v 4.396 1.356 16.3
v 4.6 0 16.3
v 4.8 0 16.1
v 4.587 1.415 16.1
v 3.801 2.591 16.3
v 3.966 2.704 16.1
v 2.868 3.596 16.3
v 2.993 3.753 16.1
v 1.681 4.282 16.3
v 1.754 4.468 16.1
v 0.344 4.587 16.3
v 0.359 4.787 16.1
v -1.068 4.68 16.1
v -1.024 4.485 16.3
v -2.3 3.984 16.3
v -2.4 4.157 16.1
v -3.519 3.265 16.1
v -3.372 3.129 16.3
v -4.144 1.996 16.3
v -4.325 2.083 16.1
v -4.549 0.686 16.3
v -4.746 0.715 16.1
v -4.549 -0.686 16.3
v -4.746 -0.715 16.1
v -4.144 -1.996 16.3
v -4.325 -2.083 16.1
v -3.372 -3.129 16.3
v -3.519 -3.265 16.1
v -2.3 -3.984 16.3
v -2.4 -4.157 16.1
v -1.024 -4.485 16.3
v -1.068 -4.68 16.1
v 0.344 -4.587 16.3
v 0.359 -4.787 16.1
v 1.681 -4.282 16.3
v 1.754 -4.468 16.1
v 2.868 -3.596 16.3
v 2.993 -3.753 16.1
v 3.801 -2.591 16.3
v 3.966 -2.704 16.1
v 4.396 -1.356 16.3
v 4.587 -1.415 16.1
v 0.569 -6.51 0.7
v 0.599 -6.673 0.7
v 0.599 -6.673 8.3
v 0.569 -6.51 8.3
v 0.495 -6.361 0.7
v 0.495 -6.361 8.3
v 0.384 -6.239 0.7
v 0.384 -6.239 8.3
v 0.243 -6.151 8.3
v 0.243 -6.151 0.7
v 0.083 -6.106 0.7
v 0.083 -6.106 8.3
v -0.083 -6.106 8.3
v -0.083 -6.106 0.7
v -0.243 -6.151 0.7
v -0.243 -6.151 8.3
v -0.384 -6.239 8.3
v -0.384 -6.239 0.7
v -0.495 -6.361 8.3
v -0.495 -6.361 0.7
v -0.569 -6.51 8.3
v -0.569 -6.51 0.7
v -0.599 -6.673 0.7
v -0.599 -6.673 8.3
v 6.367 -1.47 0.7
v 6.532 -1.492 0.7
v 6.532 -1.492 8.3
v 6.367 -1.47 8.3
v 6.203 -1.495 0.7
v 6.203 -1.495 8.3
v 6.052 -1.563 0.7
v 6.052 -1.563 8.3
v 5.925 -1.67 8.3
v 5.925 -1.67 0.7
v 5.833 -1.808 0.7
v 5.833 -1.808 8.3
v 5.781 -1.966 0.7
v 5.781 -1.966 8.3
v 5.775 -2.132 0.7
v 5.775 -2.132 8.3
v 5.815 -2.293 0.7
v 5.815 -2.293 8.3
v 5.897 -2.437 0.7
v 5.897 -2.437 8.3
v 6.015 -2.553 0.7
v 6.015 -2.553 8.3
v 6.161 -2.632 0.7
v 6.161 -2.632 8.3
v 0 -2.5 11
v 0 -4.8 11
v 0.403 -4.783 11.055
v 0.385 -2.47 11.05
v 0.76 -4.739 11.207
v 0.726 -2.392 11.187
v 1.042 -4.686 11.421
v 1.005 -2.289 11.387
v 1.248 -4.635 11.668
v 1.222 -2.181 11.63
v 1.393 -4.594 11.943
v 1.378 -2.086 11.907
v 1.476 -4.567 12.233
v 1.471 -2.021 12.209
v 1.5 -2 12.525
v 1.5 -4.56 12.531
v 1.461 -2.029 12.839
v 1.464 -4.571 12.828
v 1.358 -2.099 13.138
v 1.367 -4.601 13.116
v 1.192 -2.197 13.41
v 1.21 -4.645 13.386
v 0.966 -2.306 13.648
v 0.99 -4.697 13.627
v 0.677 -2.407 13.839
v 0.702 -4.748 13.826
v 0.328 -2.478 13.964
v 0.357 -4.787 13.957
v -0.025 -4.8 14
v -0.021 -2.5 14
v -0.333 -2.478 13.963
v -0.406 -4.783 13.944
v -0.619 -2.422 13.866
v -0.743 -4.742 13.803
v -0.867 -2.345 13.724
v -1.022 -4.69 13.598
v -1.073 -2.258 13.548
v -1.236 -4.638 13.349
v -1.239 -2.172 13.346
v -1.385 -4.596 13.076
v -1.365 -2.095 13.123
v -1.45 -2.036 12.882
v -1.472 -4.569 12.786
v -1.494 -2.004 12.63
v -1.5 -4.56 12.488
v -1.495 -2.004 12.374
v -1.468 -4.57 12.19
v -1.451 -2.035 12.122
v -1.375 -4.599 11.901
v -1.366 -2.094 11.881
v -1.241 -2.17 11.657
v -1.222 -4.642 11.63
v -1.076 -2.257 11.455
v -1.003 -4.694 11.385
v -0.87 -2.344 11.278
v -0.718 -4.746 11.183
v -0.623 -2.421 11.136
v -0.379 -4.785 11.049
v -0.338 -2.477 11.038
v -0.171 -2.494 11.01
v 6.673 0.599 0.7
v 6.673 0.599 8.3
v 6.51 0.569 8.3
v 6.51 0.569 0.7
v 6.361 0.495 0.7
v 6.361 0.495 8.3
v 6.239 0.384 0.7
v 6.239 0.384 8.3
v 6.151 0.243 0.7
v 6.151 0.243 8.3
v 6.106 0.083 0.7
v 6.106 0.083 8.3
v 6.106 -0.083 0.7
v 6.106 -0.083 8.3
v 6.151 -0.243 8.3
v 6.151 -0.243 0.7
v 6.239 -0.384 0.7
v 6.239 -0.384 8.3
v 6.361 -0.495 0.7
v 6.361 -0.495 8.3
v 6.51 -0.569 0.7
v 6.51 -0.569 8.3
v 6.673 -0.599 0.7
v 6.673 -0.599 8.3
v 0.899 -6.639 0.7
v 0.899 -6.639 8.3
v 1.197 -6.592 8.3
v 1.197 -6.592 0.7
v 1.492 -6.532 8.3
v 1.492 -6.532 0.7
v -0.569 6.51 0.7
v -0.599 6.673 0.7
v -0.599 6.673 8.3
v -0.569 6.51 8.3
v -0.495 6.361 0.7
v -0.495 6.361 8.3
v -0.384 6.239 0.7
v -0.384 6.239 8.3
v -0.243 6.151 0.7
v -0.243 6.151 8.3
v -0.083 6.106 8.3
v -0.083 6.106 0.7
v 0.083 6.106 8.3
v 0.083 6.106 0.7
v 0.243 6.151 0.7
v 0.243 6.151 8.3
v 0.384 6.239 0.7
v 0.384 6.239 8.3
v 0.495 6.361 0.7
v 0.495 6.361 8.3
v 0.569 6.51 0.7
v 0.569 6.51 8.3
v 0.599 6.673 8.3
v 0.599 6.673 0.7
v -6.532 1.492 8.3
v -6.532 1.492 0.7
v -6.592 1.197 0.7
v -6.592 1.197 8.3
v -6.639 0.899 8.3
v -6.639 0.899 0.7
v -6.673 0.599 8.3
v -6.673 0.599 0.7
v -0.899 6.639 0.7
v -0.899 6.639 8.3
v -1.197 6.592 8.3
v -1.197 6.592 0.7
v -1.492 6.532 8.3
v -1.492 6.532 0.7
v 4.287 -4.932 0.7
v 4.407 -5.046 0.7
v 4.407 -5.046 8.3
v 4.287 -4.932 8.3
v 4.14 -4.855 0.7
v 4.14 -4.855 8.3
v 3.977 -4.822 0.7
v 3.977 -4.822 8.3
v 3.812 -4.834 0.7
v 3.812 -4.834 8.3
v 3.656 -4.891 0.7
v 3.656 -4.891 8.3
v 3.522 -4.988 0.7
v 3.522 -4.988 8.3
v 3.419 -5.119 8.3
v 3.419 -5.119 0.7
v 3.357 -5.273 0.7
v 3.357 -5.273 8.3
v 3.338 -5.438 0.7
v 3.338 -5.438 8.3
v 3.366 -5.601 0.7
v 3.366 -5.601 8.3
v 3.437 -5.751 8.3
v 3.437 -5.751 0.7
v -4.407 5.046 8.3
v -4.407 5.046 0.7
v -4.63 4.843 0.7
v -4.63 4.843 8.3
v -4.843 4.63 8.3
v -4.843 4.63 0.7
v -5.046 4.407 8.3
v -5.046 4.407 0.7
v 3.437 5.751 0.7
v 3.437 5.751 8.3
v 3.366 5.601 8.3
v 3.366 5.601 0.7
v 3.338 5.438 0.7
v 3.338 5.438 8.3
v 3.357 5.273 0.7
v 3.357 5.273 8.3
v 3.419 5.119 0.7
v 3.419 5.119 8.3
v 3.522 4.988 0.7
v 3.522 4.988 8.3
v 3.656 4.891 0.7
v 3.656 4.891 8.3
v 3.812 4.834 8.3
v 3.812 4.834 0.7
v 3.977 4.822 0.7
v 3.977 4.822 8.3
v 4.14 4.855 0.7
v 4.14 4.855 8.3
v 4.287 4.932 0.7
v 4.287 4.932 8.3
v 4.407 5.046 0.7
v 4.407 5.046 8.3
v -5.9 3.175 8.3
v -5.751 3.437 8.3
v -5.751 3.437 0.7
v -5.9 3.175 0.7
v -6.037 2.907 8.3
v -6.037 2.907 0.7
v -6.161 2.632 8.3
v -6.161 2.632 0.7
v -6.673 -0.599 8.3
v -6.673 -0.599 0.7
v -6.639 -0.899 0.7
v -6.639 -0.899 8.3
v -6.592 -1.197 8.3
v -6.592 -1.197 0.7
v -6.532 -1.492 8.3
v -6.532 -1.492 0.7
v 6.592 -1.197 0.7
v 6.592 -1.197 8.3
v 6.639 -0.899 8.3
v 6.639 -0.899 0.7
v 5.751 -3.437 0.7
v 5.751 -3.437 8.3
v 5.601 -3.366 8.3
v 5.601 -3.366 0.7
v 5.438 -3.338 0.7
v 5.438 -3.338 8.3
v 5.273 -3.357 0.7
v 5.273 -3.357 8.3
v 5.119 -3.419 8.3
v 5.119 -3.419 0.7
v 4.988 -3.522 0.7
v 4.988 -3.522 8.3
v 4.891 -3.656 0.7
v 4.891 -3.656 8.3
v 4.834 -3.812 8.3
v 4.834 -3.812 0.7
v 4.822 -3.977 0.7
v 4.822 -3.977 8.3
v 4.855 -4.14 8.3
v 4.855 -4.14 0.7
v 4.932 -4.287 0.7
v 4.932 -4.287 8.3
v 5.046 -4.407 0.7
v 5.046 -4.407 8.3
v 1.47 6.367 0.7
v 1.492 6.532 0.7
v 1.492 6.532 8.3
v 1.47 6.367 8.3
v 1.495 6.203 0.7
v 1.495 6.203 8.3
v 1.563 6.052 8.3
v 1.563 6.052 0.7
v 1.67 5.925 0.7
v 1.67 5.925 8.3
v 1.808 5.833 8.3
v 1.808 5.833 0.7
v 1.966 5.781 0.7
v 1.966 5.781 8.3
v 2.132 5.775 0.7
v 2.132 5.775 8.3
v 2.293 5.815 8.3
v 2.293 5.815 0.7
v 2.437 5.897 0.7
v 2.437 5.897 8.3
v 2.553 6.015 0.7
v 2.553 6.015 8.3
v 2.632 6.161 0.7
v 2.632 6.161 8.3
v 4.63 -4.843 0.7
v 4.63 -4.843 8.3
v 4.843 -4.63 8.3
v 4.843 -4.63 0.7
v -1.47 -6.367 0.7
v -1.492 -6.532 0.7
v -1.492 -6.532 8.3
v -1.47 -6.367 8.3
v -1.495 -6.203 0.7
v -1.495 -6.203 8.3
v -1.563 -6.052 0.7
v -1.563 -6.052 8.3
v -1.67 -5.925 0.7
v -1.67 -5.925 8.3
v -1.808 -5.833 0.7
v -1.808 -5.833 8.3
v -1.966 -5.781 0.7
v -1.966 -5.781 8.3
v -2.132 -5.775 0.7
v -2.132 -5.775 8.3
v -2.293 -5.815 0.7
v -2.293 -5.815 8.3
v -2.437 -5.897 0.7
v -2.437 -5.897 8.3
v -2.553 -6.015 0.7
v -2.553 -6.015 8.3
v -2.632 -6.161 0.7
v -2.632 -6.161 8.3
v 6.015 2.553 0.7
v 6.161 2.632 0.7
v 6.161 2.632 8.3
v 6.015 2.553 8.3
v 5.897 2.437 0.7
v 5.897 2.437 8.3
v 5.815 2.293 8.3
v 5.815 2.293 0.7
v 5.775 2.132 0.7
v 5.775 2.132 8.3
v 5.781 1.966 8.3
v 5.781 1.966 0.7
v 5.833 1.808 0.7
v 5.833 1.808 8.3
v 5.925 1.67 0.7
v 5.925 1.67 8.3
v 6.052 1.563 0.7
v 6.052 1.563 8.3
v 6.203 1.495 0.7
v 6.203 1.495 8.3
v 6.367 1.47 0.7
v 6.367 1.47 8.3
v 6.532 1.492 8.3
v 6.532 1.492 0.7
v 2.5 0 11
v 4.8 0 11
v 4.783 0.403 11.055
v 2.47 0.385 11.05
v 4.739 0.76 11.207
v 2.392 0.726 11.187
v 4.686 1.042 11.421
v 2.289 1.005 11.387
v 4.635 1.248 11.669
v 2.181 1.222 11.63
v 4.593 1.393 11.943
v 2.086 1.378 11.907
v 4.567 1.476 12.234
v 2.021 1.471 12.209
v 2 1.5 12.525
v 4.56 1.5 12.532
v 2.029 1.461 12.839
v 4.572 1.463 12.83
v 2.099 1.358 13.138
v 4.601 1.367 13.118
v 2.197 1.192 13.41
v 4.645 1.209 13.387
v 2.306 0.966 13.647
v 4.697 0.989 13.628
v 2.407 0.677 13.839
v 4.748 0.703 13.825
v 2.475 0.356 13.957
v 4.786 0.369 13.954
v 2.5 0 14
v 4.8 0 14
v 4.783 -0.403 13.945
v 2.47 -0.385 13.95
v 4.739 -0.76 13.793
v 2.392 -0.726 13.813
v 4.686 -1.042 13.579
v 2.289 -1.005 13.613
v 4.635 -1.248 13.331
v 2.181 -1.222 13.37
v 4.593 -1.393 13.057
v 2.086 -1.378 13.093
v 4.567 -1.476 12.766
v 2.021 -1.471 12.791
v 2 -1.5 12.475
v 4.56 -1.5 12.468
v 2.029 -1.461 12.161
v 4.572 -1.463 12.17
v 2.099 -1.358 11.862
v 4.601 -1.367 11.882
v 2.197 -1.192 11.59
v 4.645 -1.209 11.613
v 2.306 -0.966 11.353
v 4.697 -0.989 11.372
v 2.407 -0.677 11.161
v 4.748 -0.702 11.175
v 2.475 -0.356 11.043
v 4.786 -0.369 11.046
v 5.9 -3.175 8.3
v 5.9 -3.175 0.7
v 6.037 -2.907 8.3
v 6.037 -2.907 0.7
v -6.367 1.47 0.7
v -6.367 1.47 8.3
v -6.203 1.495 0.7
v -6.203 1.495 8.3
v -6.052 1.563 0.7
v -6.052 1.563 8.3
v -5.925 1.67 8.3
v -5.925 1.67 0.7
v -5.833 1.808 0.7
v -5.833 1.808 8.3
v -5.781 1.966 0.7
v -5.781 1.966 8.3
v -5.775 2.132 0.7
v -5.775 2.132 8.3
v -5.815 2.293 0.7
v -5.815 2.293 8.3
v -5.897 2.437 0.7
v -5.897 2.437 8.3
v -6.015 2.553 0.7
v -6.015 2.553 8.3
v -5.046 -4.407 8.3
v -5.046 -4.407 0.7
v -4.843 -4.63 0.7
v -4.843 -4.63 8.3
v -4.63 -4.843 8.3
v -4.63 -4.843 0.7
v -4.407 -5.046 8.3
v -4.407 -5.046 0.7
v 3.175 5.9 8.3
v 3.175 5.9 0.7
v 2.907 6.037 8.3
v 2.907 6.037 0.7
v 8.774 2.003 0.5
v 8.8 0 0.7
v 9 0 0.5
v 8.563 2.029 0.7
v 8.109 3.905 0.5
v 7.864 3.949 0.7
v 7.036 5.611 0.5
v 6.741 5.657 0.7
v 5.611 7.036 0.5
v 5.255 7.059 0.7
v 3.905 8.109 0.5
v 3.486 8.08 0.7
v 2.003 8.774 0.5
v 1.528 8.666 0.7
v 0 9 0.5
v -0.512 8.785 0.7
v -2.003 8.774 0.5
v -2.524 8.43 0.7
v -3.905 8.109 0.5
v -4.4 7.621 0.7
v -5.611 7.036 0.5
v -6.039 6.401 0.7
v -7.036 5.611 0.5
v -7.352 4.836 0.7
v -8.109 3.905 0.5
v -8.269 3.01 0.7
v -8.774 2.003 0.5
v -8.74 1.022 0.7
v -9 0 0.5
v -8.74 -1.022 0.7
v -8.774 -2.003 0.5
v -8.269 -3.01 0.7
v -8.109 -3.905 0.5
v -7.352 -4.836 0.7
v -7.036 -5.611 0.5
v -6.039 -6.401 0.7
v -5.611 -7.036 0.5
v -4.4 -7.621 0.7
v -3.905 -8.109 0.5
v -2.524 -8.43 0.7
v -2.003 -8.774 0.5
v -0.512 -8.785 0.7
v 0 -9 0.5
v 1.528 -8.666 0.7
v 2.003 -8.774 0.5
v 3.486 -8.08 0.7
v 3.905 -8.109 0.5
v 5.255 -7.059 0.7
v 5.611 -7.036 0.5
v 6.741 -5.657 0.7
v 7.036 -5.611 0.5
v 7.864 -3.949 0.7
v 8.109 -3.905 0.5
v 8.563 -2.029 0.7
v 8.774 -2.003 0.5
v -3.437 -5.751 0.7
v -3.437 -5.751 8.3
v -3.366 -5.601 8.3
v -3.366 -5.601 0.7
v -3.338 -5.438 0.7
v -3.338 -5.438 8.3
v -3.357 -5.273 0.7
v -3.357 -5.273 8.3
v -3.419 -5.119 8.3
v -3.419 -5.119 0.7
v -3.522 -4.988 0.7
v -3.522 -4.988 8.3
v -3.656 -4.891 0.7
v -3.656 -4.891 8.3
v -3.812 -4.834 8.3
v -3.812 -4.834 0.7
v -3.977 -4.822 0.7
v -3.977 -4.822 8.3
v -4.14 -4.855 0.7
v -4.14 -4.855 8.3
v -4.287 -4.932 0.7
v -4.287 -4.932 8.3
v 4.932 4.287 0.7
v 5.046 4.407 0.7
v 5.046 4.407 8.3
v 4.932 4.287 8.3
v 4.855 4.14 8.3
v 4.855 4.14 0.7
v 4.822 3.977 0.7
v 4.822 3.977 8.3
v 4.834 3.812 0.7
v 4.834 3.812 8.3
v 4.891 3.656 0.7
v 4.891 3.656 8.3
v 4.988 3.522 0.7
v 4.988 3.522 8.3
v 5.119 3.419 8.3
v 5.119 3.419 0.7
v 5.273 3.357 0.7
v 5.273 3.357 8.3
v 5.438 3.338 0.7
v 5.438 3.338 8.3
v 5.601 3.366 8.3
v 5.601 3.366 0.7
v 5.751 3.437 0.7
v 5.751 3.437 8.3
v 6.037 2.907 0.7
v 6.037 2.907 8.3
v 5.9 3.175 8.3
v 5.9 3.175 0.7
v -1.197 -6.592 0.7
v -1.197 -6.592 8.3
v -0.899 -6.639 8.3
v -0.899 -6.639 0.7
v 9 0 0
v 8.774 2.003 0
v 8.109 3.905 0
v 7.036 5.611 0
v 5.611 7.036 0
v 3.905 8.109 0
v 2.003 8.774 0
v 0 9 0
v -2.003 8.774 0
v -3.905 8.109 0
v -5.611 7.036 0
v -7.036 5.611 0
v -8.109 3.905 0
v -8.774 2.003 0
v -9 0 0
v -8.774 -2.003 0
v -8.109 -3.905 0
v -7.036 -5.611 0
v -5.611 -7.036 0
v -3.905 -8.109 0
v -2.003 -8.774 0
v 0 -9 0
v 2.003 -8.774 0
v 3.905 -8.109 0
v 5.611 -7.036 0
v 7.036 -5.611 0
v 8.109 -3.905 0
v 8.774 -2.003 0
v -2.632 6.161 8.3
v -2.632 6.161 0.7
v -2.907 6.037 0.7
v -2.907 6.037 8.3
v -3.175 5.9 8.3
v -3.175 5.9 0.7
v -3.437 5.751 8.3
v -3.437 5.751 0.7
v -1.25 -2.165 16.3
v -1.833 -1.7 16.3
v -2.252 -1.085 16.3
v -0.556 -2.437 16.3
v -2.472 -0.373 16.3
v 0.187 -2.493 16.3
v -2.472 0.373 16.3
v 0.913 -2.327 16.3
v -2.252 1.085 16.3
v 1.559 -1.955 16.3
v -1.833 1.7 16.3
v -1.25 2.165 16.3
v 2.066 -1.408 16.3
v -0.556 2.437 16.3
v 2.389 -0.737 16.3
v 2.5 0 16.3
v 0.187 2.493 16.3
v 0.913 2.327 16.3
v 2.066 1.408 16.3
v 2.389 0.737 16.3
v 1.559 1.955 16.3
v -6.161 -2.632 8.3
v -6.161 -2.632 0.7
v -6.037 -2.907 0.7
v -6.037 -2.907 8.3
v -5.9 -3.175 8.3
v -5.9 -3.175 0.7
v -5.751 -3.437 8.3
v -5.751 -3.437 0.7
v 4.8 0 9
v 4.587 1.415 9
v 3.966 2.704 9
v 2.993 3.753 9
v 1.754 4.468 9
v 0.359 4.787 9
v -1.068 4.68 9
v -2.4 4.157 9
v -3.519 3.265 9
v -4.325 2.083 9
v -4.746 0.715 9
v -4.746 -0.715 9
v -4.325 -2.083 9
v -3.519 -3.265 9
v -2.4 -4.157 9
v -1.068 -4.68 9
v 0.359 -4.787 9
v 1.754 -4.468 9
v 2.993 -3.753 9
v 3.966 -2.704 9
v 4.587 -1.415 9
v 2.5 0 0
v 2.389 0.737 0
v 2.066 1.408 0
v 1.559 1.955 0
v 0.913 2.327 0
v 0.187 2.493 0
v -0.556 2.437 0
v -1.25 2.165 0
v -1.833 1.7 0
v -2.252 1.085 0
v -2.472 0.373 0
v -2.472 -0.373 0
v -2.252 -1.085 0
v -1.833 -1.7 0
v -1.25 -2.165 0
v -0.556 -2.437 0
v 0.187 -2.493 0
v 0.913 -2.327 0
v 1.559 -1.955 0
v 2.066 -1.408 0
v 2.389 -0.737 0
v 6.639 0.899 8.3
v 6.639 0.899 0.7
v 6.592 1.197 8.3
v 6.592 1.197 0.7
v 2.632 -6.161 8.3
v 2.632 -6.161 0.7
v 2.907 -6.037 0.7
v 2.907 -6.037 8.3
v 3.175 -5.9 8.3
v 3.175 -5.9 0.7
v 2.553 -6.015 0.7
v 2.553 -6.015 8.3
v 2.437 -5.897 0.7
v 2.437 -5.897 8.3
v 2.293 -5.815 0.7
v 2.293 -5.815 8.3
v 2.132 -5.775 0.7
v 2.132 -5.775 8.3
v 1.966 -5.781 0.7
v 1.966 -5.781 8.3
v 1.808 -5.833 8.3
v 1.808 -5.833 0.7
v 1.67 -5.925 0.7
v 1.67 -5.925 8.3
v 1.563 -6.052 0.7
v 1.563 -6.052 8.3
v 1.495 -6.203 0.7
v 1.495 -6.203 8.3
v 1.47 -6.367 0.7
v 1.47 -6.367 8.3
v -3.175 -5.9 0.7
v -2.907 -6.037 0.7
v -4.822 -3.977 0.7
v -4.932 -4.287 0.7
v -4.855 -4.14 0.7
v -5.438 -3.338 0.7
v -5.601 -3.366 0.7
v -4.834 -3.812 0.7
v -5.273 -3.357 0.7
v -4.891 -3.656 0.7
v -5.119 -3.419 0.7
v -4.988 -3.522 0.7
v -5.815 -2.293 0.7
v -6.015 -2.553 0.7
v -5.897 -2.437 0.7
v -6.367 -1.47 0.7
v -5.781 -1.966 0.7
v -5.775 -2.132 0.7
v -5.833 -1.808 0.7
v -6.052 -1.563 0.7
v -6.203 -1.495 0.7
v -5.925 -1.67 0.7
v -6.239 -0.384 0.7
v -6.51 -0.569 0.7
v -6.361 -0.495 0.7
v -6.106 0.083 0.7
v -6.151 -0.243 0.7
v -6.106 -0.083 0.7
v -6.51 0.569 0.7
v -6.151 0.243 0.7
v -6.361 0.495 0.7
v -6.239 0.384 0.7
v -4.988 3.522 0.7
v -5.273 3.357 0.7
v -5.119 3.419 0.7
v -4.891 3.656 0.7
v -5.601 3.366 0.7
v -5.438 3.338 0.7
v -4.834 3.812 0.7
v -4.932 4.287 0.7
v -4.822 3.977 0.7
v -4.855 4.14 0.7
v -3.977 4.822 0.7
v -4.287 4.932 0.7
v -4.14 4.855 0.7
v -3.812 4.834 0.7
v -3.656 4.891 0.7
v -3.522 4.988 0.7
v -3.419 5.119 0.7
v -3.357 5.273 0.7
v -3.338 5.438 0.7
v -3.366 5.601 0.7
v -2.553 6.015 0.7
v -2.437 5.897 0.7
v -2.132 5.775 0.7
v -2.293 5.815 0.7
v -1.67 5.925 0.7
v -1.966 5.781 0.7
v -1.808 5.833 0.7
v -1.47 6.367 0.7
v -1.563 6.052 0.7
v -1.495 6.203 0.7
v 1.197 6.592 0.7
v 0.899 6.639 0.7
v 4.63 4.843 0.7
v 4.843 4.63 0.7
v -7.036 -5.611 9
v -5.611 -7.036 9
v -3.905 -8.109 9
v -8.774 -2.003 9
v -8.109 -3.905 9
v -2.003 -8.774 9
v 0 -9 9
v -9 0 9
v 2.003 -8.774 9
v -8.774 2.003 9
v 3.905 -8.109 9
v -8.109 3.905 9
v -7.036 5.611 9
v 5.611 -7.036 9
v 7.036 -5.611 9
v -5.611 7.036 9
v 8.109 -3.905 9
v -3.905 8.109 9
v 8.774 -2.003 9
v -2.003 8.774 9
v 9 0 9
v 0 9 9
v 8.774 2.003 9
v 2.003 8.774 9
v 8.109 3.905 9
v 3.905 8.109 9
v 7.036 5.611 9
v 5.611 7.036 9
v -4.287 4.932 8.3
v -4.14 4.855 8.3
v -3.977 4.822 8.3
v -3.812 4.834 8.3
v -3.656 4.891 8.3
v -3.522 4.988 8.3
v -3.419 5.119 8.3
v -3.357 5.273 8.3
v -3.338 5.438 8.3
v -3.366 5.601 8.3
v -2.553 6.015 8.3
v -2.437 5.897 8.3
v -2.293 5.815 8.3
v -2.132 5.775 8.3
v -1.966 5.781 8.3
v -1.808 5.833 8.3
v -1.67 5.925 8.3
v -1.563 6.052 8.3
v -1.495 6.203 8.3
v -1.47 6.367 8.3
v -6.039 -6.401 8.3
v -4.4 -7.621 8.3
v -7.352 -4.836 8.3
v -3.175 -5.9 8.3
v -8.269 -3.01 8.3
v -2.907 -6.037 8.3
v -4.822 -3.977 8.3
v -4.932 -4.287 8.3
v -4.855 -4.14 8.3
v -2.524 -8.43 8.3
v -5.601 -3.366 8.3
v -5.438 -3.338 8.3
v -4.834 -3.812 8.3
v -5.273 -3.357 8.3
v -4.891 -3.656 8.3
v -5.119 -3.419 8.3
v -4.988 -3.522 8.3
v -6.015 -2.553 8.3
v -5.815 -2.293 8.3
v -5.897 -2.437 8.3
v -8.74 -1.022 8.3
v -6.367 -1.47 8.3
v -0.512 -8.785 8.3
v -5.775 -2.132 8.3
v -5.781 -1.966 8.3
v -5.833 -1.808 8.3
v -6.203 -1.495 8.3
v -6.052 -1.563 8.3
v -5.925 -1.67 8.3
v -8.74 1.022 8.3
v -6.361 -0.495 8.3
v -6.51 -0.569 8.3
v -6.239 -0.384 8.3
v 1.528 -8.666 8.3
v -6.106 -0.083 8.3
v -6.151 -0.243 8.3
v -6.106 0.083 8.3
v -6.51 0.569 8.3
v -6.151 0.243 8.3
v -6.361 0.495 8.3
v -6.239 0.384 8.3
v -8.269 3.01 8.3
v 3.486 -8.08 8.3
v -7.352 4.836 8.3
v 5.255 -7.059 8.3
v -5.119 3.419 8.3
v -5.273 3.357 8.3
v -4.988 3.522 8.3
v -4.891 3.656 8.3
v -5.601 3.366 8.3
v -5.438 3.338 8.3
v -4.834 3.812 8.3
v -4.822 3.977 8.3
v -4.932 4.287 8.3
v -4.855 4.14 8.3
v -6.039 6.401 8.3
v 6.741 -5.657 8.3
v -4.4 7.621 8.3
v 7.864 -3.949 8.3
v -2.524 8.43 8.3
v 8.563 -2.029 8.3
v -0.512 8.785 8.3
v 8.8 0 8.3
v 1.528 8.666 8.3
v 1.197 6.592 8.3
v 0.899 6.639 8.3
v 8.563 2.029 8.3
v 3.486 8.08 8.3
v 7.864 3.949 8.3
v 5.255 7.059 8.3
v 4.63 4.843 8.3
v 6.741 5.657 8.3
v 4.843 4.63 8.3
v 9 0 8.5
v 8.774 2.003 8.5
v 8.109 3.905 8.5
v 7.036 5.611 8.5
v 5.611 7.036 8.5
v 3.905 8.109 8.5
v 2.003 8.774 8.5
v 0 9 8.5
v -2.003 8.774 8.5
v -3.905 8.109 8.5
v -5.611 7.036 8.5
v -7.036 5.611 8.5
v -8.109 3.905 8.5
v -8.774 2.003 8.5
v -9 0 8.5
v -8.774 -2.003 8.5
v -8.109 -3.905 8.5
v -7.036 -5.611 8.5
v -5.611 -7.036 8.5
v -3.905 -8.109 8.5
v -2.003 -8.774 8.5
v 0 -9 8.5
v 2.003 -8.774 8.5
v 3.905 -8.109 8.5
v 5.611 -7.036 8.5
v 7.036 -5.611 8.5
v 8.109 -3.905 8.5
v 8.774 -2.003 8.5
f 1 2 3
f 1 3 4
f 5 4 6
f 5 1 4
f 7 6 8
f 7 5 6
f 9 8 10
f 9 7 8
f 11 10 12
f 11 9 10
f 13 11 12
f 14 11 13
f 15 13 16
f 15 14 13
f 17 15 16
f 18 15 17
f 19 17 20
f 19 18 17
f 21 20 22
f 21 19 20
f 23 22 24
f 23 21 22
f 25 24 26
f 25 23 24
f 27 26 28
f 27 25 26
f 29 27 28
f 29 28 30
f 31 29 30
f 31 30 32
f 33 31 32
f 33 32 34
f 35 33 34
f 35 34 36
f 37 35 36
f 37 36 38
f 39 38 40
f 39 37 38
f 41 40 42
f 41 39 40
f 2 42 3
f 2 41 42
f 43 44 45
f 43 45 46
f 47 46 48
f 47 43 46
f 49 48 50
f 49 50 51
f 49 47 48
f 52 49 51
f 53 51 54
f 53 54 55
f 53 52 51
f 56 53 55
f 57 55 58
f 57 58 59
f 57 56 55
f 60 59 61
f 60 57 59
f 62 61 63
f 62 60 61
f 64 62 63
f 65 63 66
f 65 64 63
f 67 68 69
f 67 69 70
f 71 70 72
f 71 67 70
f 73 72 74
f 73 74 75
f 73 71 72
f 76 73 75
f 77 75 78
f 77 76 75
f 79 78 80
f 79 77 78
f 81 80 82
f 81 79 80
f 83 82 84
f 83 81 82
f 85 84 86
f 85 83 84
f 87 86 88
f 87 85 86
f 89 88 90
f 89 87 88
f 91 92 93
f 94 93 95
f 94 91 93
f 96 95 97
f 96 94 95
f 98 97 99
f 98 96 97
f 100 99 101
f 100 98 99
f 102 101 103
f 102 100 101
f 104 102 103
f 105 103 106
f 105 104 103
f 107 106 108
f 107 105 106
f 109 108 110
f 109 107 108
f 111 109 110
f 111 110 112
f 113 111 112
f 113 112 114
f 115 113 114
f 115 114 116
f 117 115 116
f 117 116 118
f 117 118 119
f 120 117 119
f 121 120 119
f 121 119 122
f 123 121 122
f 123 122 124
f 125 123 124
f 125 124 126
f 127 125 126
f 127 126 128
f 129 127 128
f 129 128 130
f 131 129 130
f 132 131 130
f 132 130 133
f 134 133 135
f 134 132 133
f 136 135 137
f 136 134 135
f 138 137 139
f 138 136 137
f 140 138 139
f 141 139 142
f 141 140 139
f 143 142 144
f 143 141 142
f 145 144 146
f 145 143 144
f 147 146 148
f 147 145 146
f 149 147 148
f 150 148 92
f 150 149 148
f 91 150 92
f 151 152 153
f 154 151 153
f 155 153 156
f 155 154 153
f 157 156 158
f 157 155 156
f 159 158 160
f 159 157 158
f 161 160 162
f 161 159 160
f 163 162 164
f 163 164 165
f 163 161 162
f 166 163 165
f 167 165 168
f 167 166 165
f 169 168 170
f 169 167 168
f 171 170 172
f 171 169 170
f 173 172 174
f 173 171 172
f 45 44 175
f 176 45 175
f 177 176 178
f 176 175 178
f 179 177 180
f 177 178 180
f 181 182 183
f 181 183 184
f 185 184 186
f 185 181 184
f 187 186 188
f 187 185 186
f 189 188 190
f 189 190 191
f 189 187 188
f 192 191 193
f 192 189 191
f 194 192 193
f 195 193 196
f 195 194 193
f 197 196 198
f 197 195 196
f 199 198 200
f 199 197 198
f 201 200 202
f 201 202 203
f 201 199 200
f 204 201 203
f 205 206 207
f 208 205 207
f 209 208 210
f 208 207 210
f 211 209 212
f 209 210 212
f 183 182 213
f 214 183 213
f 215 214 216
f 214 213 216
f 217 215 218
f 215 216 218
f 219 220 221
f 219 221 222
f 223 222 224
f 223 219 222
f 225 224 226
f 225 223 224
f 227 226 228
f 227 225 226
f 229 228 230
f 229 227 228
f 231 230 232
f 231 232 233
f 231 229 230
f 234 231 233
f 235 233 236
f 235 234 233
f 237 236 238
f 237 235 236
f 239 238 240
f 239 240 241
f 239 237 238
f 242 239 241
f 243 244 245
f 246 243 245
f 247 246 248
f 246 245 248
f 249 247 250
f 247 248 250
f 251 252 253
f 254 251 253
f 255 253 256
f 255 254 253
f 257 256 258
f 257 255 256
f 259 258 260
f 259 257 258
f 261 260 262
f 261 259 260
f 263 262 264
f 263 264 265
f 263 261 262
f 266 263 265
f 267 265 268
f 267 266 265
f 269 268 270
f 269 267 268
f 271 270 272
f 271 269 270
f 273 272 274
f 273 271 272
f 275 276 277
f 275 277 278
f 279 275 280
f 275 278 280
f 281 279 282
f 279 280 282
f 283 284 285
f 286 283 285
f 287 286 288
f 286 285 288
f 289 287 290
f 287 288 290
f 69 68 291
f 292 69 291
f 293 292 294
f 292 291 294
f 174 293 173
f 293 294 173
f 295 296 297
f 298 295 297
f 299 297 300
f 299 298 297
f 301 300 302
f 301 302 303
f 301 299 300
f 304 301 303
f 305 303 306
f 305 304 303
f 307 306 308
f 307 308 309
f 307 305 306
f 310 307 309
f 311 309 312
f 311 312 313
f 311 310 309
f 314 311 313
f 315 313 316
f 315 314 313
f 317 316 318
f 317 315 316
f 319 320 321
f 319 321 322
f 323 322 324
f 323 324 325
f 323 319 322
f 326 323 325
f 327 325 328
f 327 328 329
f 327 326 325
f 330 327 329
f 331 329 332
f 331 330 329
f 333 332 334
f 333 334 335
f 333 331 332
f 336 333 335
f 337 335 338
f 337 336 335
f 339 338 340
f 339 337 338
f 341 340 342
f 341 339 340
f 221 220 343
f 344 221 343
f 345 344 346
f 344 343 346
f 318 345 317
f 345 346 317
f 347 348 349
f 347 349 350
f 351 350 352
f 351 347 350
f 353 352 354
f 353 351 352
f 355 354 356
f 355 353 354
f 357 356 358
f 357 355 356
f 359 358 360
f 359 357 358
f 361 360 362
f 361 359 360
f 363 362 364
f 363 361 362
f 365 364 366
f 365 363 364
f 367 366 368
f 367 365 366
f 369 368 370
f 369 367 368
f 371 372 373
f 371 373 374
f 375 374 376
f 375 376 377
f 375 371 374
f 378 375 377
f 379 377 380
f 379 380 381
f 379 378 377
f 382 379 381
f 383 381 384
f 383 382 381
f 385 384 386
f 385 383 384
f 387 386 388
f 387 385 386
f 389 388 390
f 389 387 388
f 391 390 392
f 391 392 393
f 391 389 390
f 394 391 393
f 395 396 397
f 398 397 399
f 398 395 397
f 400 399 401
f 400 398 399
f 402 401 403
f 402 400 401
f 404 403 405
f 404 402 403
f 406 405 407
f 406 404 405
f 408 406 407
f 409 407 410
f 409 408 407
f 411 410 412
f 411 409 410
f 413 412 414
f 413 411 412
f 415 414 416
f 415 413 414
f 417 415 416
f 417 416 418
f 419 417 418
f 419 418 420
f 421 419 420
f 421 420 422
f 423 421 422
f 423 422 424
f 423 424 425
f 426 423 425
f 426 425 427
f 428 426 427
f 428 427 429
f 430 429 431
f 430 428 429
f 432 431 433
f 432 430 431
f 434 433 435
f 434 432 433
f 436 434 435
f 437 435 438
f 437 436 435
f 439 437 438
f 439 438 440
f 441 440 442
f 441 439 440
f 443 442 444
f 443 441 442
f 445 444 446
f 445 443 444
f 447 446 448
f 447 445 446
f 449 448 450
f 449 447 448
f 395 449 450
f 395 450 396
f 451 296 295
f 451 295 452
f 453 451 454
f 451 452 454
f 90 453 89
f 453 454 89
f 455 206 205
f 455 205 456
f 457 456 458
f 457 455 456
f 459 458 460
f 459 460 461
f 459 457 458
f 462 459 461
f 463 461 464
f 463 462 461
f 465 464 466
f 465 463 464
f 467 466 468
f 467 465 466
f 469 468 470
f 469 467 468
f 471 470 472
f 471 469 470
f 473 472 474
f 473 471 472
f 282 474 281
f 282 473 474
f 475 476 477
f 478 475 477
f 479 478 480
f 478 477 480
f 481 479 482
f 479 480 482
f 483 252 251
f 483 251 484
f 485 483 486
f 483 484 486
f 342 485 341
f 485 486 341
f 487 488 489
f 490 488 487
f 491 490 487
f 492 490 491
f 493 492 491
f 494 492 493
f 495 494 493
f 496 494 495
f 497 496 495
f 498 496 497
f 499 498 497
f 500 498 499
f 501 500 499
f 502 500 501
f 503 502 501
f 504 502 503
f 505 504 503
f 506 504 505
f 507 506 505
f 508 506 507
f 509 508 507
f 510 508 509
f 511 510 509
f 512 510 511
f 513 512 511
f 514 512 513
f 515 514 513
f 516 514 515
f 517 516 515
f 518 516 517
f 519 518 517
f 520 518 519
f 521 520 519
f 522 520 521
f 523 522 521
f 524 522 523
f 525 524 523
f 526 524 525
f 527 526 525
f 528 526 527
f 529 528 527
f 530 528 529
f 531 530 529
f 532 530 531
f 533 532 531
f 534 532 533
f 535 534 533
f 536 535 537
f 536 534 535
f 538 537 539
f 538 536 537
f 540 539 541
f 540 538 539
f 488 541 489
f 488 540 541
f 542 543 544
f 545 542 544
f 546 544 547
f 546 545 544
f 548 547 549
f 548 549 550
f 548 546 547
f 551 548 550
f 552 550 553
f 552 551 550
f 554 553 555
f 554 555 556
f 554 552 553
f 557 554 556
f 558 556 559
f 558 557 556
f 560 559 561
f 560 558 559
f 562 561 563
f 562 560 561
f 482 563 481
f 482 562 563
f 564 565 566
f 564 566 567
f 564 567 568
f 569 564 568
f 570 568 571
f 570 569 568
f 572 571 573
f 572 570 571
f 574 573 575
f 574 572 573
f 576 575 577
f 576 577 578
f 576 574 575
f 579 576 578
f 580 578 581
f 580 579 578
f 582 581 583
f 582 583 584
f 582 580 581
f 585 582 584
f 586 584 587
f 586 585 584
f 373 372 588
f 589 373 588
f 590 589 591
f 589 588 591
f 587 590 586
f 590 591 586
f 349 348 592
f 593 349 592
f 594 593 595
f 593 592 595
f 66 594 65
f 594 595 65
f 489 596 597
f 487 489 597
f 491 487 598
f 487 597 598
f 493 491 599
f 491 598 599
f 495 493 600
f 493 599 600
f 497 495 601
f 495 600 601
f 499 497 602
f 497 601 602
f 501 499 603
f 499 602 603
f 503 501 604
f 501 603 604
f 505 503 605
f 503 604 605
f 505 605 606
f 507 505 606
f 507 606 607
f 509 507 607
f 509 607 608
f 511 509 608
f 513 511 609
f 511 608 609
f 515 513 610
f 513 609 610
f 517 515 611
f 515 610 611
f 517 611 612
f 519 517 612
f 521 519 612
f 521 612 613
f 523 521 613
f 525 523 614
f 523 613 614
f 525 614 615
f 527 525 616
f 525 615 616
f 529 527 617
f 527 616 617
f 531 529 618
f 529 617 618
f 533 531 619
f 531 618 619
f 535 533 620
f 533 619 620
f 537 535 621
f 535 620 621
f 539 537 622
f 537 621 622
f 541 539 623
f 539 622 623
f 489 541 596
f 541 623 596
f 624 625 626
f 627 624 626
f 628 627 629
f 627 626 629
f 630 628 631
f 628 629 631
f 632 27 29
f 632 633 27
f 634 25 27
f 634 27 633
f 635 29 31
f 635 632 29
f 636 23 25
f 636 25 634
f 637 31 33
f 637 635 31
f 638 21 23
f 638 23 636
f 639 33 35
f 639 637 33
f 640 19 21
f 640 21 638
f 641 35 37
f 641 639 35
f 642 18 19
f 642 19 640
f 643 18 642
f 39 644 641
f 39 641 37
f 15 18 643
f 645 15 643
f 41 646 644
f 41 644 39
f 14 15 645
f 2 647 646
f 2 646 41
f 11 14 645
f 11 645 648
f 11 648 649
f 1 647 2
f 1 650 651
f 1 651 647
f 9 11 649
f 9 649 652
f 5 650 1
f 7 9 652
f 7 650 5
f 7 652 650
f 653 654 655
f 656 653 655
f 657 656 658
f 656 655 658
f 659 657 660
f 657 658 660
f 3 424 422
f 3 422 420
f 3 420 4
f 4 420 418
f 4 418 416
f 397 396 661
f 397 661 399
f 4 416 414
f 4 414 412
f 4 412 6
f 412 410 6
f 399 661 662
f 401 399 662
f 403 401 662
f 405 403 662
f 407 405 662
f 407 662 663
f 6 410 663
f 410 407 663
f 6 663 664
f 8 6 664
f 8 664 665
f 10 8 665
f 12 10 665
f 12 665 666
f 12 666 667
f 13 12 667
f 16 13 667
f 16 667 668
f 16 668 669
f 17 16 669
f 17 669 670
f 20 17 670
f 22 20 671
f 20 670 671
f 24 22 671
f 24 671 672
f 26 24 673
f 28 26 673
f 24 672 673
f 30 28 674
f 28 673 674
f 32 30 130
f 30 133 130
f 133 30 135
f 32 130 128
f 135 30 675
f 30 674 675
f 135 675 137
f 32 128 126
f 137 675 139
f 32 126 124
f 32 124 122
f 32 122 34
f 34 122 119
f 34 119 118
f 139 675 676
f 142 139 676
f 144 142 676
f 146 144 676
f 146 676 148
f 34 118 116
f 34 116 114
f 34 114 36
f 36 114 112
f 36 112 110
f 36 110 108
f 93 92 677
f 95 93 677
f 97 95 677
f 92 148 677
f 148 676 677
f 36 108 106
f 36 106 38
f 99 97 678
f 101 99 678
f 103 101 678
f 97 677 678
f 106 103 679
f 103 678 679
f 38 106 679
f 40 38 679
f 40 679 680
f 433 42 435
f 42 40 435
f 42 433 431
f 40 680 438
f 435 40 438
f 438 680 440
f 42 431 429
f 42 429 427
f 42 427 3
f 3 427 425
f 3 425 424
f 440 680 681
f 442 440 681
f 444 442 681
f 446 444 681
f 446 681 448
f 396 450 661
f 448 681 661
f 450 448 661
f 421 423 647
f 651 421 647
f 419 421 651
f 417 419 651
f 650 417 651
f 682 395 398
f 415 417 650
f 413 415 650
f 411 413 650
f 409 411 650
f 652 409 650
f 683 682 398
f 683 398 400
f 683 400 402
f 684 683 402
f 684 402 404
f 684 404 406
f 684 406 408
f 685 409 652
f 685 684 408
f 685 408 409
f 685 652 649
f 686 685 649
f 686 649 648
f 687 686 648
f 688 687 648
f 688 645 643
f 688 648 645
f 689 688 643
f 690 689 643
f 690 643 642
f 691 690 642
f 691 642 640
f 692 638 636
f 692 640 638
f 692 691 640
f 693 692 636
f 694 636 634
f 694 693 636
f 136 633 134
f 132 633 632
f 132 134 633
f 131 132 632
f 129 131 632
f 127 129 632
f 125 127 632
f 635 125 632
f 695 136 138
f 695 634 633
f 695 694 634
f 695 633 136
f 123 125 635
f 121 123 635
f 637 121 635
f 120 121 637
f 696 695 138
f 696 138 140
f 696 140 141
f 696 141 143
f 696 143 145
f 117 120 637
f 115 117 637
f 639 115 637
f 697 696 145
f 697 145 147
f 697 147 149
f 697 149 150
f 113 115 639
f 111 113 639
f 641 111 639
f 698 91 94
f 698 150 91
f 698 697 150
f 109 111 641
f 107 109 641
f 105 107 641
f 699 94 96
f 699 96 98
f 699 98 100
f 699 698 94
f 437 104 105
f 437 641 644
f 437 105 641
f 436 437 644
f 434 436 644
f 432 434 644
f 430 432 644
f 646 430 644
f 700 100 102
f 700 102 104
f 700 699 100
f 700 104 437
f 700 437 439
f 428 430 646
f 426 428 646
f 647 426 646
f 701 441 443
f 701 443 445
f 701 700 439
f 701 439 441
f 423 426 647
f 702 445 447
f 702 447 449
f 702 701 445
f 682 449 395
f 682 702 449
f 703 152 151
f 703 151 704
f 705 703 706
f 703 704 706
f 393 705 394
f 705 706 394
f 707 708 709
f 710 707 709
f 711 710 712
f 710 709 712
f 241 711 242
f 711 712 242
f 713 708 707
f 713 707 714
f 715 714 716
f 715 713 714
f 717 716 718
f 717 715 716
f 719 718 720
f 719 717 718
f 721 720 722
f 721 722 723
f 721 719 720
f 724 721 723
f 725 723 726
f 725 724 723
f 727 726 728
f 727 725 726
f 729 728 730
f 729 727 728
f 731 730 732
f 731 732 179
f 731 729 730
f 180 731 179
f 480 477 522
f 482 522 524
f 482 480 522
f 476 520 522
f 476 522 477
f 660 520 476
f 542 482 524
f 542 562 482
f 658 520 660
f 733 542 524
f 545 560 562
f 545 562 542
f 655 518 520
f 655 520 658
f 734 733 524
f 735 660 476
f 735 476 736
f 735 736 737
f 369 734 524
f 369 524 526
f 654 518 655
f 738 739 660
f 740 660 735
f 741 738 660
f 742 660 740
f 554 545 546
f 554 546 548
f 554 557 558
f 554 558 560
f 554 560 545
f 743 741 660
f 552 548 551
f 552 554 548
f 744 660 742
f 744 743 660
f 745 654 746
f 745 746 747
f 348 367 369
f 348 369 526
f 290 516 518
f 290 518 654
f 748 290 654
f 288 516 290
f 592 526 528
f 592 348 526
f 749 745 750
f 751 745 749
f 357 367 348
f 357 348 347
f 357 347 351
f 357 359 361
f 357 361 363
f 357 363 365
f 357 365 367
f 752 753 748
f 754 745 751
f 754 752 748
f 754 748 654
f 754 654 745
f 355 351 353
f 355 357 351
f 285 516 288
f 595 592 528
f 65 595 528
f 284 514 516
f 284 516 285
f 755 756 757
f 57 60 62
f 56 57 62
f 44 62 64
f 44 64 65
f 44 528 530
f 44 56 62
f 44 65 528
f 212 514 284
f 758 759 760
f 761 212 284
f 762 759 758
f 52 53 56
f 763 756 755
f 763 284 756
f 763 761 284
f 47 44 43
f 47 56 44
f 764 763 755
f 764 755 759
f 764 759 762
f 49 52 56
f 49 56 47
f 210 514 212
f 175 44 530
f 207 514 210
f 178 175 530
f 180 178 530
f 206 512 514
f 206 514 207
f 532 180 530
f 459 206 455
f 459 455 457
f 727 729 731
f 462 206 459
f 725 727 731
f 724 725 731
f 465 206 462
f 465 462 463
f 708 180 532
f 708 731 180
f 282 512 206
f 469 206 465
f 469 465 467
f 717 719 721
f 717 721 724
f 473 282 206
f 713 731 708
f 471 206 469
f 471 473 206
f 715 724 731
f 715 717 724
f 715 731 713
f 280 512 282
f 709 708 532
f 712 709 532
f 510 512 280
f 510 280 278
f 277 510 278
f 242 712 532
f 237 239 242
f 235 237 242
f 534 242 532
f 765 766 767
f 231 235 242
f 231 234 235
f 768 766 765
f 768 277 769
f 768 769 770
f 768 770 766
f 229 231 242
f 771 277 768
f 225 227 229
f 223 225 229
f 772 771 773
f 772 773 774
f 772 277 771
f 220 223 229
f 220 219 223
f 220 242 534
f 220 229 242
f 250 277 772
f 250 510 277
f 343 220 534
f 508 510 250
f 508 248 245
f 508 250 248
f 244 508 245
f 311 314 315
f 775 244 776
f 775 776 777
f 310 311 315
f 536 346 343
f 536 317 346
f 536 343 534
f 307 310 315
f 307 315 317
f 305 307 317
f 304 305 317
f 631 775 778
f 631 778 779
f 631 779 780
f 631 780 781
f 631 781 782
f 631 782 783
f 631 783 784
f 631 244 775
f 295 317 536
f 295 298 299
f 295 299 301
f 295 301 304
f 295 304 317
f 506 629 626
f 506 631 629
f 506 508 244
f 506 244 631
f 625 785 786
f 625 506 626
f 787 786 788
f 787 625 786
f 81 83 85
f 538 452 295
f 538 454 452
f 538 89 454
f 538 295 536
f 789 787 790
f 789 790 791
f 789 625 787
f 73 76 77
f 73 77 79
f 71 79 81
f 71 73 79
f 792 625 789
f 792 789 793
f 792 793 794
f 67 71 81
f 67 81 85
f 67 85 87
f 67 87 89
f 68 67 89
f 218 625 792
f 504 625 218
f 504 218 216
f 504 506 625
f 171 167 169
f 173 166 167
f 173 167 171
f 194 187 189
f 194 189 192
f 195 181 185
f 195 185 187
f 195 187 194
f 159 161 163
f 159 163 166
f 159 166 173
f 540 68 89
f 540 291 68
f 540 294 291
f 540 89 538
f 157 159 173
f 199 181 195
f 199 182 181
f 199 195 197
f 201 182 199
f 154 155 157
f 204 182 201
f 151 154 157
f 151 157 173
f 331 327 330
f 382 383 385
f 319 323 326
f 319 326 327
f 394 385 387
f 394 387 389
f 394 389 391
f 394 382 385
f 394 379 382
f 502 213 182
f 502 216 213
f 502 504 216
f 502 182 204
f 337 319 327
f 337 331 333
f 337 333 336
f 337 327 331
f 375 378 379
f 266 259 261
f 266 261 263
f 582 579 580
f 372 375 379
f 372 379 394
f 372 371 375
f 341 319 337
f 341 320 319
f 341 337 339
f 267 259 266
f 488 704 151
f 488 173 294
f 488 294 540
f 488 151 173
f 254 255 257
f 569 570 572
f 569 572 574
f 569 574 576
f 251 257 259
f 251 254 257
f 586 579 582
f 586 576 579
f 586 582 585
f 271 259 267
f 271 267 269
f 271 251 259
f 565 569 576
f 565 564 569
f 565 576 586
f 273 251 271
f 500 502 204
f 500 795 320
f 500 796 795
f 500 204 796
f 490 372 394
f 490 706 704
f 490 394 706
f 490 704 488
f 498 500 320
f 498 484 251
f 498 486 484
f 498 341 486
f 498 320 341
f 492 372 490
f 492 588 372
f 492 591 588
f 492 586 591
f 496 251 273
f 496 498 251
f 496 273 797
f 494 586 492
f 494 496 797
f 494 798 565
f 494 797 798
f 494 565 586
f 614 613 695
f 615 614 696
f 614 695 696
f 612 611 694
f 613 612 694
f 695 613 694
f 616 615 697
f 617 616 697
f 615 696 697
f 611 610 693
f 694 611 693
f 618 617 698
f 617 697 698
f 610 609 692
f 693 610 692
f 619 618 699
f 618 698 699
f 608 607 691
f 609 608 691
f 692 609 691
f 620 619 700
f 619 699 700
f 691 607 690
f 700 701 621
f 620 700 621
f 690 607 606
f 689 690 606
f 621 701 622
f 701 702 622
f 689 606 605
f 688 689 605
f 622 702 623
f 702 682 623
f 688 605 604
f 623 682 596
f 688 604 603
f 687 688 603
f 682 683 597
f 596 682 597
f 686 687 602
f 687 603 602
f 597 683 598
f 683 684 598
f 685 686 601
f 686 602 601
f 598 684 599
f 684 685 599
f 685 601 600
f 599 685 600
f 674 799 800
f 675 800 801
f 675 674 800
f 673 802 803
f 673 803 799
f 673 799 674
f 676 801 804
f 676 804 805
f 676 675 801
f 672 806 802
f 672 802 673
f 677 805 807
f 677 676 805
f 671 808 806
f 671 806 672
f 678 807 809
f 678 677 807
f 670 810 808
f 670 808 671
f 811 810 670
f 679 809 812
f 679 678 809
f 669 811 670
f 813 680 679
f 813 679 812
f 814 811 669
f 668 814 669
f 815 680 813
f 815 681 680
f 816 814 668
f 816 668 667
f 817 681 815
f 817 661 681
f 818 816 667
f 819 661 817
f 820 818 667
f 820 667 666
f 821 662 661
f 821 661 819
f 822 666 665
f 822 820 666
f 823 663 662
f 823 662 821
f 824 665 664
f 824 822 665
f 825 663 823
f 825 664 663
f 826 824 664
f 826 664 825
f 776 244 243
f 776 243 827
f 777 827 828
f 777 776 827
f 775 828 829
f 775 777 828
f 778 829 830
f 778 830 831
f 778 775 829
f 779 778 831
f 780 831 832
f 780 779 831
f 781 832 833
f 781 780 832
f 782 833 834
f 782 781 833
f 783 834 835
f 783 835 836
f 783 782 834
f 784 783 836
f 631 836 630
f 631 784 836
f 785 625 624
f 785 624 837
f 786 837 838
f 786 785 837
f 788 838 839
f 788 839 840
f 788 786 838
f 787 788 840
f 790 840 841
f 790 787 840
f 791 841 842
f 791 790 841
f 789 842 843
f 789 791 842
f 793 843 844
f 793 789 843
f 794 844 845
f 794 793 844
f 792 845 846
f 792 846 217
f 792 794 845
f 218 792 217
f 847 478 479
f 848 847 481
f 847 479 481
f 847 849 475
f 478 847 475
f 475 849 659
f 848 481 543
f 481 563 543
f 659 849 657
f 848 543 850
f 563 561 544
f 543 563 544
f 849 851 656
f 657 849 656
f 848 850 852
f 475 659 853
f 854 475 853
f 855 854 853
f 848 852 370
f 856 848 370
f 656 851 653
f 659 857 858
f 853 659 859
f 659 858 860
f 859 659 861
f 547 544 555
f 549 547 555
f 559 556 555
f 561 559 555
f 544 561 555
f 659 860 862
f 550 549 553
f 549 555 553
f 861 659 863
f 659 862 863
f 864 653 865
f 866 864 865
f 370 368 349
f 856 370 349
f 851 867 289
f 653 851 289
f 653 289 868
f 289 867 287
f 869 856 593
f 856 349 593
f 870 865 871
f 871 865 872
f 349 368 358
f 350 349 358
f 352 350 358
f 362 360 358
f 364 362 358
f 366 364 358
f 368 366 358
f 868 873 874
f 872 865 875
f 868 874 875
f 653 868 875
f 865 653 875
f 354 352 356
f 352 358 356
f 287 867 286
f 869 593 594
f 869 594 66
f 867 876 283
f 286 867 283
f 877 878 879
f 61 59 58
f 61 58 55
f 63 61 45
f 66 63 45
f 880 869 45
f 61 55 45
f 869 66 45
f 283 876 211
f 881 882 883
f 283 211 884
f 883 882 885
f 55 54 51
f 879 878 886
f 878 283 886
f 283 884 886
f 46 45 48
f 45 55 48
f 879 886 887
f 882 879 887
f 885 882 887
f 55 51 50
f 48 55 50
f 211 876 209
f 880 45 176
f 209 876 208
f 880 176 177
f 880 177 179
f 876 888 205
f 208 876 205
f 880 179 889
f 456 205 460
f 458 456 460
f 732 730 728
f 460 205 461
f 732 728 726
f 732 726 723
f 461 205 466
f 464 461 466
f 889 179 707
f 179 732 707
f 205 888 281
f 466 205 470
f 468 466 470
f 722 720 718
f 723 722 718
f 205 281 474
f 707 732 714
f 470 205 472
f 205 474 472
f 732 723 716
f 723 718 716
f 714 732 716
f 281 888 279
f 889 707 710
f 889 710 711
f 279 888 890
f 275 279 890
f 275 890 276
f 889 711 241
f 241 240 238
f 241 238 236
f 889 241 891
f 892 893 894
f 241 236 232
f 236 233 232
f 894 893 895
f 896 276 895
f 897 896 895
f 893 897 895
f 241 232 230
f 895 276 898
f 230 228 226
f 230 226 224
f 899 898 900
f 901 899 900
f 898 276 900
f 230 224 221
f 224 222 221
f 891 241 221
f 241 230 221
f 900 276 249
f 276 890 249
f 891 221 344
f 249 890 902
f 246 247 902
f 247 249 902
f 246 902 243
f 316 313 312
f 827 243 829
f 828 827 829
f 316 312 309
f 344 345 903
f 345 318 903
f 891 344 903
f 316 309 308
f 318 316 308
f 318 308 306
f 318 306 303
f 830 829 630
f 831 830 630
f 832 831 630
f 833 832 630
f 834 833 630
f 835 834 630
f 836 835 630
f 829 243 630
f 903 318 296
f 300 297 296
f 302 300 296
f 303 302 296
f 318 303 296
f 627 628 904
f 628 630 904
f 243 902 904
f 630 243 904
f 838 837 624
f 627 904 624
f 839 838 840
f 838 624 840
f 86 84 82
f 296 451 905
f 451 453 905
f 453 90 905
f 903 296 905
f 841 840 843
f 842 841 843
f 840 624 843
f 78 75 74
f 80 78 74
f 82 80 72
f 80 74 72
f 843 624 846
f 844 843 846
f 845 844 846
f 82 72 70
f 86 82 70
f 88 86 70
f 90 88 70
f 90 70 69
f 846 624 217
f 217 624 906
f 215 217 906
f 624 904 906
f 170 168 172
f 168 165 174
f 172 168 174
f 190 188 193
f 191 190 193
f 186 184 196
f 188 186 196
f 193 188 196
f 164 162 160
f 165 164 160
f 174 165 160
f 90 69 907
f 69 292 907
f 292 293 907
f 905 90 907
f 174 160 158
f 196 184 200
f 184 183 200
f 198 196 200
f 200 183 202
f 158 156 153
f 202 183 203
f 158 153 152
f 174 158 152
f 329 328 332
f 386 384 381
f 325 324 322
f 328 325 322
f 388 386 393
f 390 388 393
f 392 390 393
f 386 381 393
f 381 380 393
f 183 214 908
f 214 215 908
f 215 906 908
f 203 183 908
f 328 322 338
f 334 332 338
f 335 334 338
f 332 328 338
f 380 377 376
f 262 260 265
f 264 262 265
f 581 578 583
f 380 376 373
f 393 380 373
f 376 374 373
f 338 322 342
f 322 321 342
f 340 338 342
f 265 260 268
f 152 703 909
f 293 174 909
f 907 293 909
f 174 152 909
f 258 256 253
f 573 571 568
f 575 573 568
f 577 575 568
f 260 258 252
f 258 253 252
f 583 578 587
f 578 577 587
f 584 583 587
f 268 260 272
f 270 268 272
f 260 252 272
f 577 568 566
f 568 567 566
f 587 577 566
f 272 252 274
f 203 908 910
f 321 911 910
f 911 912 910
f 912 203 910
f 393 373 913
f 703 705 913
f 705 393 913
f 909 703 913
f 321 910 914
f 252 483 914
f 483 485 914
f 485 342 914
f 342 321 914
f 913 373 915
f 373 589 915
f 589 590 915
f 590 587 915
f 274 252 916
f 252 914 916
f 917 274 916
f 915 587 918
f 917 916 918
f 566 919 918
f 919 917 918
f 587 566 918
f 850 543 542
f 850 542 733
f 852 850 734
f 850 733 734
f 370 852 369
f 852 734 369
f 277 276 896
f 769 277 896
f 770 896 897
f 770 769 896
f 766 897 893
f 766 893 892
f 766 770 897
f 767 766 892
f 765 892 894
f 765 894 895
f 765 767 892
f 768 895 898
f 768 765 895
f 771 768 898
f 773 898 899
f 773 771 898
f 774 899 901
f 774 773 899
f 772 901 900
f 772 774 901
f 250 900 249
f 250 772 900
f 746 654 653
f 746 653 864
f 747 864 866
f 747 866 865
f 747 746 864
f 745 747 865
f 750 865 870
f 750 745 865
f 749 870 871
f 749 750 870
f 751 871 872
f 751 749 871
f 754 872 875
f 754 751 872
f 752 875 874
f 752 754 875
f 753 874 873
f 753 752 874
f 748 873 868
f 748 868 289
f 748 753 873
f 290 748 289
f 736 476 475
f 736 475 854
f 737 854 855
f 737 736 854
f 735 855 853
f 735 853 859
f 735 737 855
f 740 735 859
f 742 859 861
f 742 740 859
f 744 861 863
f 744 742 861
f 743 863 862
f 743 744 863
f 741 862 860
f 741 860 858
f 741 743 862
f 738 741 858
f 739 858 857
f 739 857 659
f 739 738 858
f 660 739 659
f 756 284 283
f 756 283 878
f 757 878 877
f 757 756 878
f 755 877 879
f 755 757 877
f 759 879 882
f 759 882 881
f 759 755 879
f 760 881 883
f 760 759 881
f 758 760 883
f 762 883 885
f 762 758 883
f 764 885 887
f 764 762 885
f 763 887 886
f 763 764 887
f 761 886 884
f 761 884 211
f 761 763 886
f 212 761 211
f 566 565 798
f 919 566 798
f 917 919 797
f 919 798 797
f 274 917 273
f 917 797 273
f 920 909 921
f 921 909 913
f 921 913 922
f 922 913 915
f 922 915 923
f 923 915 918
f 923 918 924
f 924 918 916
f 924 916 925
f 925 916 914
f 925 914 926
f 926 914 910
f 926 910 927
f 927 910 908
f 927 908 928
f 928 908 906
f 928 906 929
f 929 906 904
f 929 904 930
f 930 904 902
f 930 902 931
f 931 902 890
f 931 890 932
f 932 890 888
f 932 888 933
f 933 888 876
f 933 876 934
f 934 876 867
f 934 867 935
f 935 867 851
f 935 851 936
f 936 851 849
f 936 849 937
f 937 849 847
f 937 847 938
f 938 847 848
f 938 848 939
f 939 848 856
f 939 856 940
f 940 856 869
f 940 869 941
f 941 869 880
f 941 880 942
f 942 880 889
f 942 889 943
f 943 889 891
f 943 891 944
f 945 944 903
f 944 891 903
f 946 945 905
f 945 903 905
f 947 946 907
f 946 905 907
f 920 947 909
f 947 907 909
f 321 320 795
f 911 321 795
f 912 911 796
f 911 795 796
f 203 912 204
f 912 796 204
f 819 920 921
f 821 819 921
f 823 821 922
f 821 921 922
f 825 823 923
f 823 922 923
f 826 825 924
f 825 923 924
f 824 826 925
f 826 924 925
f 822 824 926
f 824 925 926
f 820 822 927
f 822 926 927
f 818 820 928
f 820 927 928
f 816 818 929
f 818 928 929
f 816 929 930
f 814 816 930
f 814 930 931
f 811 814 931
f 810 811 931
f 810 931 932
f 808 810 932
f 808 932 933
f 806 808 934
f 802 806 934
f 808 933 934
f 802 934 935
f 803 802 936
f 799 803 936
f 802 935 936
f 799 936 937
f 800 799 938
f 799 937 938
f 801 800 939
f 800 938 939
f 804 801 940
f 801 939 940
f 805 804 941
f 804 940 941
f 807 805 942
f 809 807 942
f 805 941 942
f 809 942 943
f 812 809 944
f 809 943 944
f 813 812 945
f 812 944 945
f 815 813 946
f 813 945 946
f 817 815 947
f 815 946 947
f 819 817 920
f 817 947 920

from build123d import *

# Parameters (mm, degrees)
CYLINDER004_R     = 2.5
CYLINDER004_DEPTH = 16.6
CYLINDER005_R     = 1.5
CYLINDER005_DEPTH = 9
CYLINDER008_R     = 1.5
CYLINDER008_DEPTH = 9
CYLINDER007_R     = 4.8
CYLINDER007_DEPTH = 7.3
CHAMFER003_SIZE   = 0.2
CYLINDER002_R     = 9
CYLINDER002_DEPTH = 0.7
CHAMFER_SIZE      = 0.2
CYLINDER003_R     = 9
CYLINDER003_DEPTH = 0.7
CHAMFER001_SIZE   = 0.2
CYLINDER_R        = 0.6
CYLINDER_DEPTH    = 7.6
ARRAY_COUNT       = 20
CYLINDER001_R     = 6.7
CYLINDER001_DEPTH = 7.6


with BuildPart() as cilindro004:
    # Cylinder004 → Cylinder004 (new body)
    with BuildSketch(Plane.XY):
        Circle(CYLINDER004_R)
    extrude(amount=CYLINDER004_DEPTH)


with BuildPart() as cilindro005:
    # Cylinder005 → Cylinder005 (new body)
    with BuildSketch(Plane(origin=(1, 0, 3.5), x_dir=(0, 0, -1), z_dir=(1, 0, 0))):
        Circle(CYLINDER005_R)
    extrude(amount=CYLINDER005_DEPTH)


with BuildPart() as fusion001:
    # Cylinder008 → Cylinder008 (new body)
    with BuildSketch(Plane(origin=(0, -1, 3.5), x_dir=(0, 0, -1), z_dir=(0, -1, 0))):
        Circle(CYLINDER008_R)
    extrude(amount=CYLINDER008_DEPTH)

    # Fusion001: union Cilindro005
    add(cilindro005.part)


with BuildPart() as cut001:
    # Cylinder007 → Cylinder007 (new body)
    with BuildSketch(Plane.XY):
        Circle(CYLINDER007_R)
    extrude(amount=CYLINDER007_DEPTH)

    # Chamfer003
    chamfer003_edges = [cut001.edges().sort_by_distance(p)[0] for p in [
        (-4.8, 0, 7.3),
    ]]
    chamfer(chamfer003_edges, length=CHAMFER003_SIZE)

    # Cut001: cut Fusion001
    add(fusion001.part, mode=Mode.SUBTRACT)


with BuildPart() as cut001_1:
    # Cut001 placement: moved
    add(cut001.part.moved(Location((0, 0, 9))))


with BuildPart() as chamfer_body:
    # Cylinder002 → Cylinder002 (new body)
    with BuildSketch(Plane.XY):
        Circle(CYLINDER002_R)
    extrude(amount=CYLINDER002_DEPTH)

    # Chamfer
    chamfer_edges = [chamfer_body.edges().sort_by_distance(p)[0] for p in [
        (-9, 0, 0.7),
    ]]
    chamfer(chamfer_edges, length=CHAMFER_SIZE)


with BuildPart() as chamfer001:
    # Cylinder003 → Cylinder003 (new body)
    with BuildSketch(Plane.XY.offset(8.3)):
        Circle(CYLINDER003_R)
    extrude(amount=CYLINDER003_DEPTH)

    # Chamfer001
    chamfer001_edges = [chamfer001.edges().sort_by_distance(p)[0] for p in [
        (-9, 0, 8.3),
    ]]
    chamfer(chamfer001_edges, length=CHAMFER001_SIZE)


with BuildPart() as array:
    # Cylinder → Cylinder (new body)
    with BuildSketch(Plane(origin=(6.7, 0, 0), x_dir=(1, 0, 0), z_dir=(0, 0, 1))):
        Circle(CYLINDER_R)
    extrude(amount=CYLINDER_DEPTH)

    # Array: Array ×20 about axis
    array_axis = Axis((0, 0, 0), (0, 0, 1))


with BuildPart() as array_1:
    add(array.part)
    for i in range(1, ARRAY_COUNT):
        add(array.part.rotate(array_axis, i * 360 / ARRAY_COUNT))


with BuildPart() as poleagt2:
    # Cylinder001 → Cylinder001 (new body)
    with BuildSketch(Plane.XY):
        Circle(CYLINDER001_R)
    extrude(amount=CYLINDER001_DEPTH)

    # Cut: cut Array
    add(array_1.part, mode=Mode.SUBTRACT)


with BuildPart() as poleagt2_1:
    # Cut placement: moved
    add(poleagt2.part.moved(Location((0, 0, 0.7))))

    # Fusion: union Chamfer body, Chamfer001
    add(chamfer_body.part)
    add(chamfer001.part)

    # Fusion002: union Cut001
    add(cut001_1.part)

    # Cut002: cut Cilindro004
    add(cilindro004.part, mode=Mode.SUBTRACT)


solid = poleagt2_1.part
